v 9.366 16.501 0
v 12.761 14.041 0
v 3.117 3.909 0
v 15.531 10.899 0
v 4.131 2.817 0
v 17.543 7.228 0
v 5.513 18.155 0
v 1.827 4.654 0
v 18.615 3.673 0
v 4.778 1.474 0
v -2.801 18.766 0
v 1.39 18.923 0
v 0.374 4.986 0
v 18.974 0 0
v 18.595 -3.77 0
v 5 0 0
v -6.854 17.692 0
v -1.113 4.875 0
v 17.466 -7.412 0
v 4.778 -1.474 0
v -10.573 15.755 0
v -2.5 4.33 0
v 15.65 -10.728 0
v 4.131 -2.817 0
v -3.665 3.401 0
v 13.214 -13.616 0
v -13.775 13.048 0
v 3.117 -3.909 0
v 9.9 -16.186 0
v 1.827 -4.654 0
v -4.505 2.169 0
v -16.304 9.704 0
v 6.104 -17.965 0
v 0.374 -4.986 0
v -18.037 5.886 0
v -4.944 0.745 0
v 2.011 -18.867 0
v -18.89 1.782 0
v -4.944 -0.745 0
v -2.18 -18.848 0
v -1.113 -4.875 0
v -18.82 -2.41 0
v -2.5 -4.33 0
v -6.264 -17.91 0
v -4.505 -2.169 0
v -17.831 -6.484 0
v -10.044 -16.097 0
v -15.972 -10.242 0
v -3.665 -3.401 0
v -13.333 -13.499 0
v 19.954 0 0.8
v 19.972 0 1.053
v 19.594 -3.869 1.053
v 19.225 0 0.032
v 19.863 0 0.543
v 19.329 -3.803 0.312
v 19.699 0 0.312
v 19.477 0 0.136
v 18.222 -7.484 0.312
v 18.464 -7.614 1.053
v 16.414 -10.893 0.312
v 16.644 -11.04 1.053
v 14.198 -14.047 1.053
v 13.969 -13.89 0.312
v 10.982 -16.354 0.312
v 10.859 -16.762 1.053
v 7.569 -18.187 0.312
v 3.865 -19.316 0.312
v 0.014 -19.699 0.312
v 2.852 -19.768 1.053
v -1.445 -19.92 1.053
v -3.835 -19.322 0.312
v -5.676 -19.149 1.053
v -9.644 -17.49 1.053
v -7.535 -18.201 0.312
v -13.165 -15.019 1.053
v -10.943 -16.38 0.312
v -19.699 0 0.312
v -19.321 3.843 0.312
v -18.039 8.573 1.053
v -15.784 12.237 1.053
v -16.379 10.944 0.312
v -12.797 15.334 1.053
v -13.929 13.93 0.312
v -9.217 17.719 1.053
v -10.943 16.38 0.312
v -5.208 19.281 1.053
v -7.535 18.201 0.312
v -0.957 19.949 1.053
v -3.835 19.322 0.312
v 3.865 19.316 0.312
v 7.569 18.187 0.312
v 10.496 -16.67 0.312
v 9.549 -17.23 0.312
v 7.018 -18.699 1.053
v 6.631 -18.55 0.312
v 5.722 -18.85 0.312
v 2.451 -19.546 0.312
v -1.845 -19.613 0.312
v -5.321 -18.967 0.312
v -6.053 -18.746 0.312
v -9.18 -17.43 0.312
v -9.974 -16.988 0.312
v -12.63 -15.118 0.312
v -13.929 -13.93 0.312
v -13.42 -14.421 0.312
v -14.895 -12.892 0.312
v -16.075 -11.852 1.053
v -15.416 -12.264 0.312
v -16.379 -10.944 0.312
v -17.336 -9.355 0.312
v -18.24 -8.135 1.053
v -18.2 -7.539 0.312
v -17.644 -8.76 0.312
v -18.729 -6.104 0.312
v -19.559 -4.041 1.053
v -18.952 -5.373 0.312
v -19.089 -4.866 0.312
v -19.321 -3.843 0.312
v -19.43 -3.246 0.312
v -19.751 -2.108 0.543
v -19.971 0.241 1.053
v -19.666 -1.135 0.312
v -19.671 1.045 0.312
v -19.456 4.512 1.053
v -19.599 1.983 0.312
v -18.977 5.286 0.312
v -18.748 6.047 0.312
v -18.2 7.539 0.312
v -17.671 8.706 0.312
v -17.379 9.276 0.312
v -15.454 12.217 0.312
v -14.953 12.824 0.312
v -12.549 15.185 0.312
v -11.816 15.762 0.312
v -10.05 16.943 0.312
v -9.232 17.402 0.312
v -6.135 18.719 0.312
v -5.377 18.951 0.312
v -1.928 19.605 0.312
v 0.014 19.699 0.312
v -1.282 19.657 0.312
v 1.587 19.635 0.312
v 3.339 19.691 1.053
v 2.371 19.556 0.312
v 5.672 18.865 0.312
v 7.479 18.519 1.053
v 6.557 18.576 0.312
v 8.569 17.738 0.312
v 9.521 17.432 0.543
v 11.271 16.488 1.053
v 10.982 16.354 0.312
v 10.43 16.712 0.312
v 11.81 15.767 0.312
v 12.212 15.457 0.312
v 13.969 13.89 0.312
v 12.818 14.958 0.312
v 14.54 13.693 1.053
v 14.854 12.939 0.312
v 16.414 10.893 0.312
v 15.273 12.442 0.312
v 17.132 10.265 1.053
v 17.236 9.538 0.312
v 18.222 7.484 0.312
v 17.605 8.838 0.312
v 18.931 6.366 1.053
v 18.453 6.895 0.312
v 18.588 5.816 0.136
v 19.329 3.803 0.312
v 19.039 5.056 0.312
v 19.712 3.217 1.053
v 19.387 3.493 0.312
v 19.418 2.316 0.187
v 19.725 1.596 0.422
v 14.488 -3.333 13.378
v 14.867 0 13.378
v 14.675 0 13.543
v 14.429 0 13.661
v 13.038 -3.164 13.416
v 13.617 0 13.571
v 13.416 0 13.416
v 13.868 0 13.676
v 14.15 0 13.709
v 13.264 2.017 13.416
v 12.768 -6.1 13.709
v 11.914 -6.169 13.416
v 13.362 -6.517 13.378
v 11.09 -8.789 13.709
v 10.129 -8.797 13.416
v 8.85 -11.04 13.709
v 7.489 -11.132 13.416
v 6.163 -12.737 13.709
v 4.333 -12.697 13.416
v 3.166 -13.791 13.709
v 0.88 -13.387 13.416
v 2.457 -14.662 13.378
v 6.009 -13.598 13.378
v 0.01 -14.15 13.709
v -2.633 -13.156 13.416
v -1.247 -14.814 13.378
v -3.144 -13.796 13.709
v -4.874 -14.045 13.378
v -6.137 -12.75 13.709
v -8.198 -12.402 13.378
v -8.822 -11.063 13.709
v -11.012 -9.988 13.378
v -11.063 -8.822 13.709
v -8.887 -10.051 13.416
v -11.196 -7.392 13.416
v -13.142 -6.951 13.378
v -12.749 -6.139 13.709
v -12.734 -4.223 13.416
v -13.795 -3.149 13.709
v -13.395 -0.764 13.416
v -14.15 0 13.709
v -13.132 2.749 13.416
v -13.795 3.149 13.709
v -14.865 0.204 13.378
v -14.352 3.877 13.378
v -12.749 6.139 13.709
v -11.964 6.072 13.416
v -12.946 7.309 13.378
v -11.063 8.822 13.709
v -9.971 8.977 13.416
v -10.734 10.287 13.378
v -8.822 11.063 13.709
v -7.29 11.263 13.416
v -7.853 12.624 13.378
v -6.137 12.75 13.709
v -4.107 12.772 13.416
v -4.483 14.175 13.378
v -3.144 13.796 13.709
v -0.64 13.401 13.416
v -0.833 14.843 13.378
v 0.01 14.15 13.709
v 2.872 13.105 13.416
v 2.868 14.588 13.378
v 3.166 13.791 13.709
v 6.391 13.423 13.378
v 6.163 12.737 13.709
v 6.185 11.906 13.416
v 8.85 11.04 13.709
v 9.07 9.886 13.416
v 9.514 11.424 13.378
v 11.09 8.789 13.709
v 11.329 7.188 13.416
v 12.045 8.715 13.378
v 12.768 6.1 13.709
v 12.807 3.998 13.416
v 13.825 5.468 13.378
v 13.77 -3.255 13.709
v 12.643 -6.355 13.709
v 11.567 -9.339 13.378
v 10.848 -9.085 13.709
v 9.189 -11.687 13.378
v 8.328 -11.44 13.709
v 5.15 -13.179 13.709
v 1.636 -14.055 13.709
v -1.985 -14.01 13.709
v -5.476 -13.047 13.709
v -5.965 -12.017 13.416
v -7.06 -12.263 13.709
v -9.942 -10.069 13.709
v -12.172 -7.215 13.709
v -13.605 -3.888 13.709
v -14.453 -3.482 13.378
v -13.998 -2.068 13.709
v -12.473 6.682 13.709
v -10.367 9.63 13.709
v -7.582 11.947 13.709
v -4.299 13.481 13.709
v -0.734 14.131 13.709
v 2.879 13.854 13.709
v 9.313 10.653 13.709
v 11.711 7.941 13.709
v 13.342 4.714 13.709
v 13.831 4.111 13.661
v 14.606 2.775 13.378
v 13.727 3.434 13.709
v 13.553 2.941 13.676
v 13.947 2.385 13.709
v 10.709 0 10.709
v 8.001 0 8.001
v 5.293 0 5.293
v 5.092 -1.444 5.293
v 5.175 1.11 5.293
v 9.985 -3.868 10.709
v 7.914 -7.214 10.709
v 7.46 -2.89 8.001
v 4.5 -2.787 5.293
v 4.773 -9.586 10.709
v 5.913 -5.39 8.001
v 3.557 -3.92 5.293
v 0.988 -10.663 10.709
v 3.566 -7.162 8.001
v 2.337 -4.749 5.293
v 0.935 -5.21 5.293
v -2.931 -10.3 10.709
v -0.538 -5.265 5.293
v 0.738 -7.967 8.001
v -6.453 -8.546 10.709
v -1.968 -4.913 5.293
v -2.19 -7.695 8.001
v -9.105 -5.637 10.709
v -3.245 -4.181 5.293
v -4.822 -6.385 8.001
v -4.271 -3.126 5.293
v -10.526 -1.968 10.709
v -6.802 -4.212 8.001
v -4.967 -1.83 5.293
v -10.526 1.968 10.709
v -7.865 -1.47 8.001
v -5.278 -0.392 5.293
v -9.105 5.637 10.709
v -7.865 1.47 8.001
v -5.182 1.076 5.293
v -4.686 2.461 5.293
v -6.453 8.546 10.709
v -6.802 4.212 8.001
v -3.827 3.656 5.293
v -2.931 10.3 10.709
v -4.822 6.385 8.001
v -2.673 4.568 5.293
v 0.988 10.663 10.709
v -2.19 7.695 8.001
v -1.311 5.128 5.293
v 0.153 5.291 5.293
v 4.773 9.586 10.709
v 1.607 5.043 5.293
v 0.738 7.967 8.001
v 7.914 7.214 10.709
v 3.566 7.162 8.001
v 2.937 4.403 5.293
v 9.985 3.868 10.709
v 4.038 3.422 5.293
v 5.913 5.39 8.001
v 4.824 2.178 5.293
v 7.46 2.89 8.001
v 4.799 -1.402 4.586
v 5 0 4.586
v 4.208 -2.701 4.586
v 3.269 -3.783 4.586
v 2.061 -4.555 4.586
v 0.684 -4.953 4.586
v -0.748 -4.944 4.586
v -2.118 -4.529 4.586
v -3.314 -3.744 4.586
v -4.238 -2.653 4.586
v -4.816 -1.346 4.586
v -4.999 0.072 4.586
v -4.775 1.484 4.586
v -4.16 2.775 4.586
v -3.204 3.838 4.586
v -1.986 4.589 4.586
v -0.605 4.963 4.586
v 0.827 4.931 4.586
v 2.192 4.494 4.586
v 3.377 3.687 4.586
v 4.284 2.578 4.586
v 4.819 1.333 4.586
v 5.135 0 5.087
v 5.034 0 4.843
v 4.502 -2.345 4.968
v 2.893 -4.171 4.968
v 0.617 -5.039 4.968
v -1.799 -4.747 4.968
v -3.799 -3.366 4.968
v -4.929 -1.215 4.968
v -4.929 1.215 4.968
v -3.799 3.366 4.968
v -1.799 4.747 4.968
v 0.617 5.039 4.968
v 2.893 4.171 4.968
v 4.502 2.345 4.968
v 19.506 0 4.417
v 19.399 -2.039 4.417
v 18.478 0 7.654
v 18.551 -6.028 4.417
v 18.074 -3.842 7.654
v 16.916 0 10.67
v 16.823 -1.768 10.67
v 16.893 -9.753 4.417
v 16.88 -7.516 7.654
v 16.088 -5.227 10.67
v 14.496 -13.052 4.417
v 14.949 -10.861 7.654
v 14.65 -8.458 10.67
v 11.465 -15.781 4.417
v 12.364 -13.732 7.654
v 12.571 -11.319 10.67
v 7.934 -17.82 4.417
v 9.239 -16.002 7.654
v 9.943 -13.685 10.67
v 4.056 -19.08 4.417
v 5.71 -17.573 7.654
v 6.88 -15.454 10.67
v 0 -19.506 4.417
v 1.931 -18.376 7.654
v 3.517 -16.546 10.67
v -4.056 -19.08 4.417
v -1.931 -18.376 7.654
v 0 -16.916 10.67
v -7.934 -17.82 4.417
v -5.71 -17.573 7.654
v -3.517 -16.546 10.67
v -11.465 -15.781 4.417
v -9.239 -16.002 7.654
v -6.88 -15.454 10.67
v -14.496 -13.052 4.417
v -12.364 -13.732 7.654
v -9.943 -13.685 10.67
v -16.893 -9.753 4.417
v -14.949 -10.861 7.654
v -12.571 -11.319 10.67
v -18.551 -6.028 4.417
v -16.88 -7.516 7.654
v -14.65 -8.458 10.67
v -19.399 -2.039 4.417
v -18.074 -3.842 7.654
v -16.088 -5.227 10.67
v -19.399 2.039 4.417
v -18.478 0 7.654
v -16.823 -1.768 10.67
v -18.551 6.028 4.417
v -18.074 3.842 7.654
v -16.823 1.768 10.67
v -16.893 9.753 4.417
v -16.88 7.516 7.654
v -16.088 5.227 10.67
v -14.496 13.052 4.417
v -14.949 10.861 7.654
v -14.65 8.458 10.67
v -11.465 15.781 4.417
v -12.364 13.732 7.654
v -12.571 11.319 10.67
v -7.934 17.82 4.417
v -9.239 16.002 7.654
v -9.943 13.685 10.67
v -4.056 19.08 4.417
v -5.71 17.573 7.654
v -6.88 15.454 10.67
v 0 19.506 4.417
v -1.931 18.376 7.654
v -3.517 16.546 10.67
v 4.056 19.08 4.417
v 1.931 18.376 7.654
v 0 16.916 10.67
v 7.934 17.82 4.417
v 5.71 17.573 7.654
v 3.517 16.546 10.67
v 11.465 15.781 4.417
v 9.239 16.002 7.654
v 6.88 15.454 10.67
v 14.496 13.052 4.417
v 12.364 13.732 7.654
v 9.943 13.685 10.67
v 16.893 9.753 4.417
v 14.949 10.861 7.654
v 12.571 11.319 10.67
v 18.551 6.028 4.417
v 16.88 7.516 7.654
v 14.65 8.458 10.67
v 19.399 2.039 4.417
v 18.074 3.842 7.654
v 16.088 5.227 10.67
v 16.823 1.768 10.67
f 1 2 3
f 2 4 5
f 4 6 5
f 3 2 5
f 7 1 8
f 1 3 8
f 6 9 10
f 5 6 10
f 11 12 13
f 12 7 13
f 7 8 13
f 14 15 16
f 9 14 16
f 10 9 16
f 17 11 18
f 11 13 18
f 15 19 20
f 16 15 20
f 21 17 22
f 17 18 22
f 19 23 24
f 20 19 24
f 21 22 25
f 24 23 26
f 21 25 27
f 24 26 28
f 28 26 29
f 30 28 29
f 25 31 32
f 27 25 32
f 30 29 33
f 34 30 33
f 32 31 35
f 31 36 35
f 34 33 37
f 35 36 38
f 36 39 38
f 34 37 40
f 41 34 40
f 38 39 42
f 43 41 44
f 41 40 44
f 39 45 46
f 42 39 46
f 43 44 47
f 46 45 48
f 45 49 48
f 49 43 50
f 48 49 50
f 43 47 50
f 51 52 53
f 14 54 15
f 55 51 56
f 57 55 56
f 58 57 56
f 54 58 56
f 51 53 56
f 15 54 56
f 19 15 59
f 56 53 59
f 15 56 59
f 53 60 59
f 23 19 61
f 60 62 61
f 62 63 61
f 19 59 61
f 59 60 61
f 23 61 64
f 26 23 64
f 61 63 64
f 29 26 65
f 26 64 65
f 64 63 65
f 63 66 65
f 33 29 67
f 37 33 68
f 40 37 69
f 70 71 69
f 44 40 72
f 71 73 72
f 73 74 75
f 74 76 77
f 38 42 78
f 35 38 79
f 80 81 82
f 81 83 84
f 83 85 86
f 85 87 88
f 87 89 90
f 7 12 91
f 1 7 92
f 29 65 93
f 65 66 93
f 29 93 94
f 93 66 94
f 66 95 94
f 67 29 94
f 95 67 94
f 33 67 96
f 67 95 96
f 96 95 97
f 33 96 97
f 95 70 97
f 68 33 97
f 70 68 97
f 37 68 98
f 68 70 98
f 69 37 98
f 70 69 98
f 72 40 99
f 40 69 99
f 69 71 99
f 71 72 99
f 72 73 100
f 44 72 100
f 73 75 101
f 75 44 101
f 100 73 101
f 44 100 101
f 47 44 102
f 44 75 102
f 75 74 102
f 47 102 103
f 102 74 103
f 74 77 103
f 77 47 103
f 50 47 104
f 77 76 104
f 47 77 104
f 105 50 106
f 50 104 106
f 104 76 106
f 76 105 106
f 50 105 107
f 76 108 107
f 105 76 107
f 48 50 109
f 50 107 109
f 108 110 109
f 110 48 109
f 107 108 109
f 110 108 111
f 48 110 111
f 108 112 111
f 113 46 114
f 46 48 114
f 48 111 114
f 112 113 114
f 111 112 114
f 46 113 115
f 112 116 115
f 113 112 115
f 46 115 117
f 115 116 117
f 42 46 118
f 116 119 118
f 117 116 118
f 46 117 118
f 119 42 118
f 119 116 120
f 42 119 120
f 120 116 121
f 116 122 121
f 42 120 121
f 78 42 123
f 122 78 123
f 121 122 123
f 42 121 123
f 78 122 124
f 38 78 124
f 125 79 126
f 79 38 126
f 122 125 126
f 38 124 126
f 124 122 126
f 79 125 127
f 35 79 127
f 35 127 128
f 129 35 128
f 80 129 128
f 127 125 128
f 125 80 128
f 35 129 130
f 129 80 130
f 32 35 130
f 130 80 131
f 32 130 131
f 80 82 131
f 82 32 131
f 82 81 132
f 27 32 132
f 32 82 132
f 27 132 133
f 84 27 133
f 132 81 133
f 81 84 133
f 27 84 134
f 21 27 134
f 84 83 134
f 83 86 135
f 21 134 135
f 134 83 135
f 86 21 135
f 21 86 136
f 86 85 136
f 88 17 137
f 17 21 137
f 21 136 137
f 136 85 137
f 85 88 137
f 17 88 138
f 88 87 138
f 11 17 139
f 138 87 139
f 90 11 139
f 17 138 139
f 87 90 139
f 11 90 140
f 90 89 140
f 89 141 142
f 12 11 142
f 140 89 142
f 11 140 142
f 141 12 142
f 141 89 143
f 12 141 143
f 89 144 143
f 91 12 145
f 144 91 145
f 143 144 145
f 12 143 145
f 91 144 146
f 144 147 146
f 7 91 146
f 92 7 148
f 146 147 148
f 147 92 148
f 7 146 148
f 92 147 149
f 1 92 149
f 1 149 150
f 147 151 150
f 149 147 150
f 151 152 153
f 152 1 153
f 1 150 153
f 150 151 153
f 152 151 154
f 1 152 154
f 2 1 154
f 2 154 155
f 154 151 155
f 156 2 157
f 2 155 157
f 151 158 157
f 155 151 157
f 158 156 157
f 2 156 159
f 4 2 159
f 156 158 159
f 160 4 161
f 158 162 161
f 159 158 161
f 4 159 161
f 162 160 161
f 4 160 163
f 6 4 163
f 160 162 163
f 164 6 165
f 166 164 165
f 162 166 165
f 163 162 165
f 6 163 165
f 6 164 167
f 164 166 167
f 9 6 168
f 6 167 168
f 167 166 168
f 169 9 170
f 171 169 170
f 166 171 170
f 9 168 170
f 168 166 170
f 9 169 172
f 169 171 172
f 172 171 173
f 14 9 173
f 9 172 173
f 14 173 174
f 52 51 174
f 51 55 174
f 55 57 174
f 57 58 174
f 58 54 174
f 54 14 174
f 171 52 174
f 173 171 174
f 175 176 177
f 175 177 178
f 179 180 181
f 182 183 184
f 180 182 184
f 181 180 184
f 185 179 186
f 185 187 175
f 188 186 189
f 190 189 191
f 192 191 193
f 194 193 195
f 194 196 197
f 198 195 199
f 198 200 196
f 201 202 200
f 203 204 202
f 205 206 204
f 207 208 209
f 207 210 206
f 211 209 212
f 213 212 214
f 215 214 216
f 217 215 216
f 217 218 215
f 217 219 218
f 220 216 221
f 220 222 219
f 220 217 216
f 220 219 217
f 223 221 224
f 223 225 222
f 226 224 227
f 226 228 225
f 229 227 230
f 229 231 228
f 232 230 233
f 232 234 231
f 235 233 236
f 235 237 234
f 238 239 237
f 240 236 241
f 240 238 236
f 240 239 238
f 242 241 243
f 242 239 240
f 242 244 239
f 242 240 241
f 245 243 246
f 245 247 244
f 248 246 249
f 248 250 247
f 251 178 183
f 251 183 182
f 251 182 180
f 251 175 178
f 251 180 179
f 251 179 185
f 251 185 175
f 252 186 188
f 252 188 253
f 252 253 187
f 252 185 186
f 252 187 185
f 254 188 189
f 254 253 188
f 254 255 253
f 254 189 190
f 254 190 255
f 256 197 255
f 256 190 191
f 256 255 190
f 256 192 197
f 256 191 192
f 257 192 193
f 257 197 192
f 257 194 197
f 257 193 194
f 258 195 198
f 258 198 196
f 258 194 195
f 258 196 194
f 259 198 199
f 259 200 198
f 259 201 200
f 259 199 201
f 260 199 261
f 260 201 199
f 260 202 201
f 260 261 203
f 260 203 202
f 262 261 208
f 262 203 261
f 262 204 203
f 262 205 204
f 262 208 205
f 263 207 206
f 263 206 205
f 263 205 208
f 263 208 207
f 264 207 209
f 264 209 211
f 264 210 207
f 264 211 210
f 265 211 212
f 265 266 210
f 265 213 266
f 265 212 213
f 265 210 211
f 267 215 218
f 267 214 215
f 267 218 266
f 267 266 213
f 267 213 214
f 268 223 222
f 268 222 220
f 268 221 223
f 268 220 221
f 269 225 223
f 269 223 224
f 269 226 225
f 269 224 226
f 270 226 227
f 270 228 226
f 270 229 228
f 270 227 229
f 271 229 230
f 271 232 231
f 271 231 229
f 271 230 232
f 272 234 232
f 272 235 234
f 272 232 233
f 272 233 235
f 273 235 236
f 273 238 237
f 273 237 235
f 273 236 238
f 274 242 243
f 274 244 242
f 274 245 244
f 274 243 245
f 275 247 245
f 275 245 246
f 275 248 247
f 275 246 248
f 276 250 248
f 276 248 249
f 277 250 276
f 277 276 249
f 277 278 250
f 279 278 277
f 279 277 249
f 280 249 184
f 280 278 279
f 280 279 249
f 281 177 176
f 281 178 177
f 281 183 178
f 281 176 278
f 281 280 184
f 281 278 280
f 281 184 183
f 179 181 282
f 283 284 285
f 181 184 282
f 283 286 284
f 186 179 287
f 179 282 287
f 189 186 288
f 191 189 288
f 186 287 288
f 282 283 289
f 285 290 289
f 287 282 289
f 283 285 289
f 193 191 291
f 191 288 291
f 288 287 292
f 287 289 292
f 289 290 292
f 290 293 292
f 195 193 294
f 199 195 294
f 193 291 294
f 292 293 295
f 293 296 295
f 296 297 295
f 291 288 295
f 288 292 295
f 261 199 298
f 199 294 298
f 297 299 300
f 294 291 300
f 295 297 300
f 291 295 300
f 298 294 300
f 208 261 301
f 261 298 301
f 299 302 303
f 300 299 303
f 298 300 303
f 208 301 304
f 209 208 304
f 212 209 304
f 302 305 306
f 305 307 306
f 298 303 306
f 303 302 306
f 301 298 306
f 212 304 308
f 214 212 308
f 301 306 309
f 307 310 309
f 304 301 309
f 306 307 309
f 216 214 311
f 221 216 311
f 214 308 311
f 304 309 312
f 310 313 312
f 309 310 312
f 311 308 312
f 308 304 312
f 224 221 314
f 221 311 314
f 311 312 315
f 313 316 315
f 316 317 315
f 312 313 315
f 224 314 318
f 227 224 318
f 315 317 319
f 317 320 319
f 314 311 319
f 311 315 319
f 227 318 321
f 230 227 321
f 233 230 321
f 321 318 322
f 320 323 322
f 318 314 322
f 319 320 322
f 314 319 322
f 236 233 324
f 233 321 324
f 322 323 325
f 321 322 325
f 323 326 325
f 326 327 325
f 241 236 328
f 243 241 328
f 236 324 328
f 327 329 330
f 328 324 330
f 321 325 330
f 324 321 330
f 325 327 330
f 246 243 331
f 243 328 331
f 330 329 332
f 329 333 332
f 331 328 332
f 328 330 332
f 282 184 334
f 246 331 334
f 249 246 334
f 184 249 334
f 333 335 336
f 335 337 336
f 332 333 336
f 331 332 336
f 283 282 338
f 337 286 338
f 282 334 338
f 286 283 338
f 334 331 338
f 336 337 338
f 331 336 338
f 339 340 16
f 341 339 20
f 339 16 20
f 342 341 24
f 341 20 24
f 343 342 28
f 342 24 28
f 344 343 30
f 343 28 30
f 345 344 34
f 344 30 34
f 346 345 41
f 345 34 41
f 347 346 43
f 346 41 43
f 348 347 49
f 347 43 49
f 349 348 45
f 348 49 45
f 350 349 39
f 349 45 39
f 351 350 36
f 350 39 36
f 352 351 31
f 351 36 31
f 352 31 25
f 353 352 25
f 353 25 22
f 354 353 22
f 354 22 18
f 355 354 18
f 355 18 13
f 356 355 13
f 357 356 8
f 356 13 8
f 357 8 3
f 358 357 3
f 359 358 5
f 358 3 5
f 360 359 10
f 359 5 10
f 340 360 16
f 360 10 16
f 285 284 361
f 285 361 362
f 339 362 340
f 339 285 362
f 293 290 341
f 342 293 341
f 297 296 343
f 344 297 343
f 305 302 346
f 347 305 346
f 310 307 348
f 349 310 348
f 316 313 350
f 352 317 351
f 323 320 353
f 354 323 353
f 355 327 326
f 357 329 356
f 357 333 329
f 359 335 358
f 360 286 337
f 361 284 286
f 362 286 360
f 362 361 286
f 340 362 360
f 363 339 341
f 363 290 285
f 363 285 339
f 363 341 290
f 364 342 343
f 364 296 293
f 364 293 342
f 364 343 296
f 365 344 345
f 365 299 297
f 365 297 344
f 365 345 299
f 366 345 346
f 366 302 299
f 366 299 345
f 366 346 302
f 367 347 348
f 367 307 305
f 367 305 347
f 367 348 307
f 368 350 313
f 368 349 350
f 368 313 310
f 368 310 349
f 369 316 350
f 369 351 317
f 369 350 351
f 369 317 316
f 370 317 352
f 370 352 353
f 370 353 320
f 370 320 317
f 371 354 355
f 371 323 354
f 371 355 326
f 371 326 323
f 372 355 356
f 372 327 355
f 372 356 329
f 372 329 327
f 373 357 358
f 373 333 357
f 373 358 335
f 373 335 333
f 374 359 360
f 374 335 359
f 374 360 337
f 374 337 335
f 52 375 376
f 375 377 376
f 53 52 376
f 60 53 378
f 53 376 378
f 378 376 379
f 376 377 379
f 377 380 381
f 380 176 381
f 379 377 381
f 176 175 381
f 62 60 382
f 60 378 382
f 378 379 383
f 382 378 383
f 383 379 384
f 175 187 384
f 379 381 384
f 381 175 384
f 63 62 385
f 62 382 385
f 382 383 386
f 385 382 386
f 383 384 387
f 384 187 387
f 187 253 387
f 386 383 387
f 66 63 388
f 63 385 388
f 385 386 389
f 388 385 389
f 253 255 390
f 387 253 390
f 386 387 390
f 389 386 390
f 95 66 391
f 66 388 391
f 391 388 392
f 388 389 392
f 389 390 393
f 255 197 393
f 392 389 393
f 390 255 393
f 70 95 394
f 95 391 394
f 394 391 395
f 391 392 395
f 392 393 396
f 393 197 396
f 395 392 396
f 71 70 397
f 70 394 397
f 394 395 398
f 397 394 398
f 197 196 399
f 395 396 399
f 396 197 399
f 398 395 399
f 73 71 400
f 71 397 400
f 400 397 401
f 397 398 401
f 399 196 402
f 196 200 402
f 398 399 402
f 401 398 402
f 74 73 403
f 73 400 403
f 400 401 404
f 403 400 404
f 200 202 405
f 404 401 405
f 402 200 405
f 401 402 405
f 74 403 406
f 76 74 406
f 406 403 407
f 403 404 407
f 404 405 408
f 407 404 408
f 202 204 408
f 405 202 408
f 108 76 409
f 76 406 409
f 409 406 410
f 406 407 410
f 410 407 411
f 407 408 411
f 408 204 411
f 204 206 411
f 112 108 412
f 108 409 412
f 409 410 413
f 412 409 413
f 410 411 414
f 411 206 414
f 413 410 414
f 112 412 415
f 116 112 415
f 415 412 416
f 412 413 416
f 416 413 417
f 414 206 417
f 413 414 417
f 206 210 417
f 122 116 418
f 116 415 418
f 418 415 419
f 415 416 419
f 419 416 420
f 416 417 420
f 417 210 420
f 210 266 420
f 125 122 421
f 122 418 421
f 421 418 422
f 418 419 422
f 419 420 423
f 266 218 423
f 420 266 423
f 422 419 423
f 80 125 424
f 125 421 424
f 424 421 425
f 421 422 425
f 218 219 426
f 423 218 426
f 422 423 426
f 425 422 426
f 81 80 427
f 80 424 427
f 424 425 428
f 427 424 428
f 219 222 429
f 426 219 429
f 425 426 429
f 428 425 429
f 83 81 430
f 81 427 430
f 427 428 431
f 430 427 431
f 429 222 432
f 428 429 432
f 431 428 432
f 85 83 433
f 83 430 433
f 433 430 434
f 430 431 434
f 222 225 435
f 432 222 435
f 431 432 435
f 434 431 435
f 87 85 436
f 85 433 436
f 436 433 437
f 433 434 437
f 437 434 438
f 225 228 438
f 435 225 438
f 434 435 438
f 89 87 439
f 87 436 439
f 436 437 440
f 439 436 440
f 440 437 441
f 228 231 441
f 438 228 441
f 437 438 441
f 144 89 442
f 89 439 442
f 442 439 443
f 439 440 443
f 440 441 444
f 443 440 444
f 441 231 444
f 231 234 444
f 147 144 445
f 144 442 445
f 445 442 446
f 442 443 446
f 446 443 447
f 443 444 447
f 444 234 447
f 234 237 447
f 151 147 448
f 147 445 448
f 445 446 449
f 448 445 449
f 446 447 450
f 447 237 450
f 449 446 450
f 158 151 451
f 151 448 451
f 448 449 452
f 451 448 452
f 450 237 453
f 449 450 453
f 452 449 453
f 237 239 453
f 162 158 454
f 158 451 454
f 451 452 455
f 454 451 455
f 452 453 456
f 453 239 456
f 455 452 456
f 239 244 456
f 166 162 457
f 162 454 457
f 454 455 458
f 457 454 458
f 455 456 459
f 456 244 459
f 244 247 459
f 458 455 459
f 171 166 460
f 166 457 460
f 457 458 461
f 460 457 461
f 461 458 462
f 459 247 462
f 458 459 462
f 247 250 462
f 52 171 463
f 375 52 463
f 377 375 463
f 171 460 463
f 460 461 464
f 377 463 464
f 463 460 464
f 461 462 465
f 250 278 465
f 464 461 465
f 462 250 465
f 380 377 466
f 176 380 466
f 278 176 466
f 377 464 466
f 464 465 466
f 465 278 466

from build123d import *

# Parameters (mm, degrees)
F2_R = 1


with BuildPart() as f1:
    # F0 (on Front) → F1 (revolve)
    with BuildSketch(Plane.XZ):
        with BuildLine():
            ThreePointArc((20, 0), (18.4775906502, 7.6536686473), (14.1421356237, 14.1421356237))
            Line((14.1421356237, 14.1421356237), (5, 5))
            Line((5, 5), (5, 0))
            Line((5, 0), (20, 0))
        make_face()
    revolve(axis=Axis((0, 0, 1.4953076416), (0, 0, -1)))

    # F2
    f2_edges = [f1.edges().sort_by_distance(p)[0] for p in [
        (-5, 0, 5),
        (-14.142136, 0, 14.142136),
        (-20, 0, 0),
    ]]
    fillet(f2_edges, radius=F2_R)


solid = f1.part
